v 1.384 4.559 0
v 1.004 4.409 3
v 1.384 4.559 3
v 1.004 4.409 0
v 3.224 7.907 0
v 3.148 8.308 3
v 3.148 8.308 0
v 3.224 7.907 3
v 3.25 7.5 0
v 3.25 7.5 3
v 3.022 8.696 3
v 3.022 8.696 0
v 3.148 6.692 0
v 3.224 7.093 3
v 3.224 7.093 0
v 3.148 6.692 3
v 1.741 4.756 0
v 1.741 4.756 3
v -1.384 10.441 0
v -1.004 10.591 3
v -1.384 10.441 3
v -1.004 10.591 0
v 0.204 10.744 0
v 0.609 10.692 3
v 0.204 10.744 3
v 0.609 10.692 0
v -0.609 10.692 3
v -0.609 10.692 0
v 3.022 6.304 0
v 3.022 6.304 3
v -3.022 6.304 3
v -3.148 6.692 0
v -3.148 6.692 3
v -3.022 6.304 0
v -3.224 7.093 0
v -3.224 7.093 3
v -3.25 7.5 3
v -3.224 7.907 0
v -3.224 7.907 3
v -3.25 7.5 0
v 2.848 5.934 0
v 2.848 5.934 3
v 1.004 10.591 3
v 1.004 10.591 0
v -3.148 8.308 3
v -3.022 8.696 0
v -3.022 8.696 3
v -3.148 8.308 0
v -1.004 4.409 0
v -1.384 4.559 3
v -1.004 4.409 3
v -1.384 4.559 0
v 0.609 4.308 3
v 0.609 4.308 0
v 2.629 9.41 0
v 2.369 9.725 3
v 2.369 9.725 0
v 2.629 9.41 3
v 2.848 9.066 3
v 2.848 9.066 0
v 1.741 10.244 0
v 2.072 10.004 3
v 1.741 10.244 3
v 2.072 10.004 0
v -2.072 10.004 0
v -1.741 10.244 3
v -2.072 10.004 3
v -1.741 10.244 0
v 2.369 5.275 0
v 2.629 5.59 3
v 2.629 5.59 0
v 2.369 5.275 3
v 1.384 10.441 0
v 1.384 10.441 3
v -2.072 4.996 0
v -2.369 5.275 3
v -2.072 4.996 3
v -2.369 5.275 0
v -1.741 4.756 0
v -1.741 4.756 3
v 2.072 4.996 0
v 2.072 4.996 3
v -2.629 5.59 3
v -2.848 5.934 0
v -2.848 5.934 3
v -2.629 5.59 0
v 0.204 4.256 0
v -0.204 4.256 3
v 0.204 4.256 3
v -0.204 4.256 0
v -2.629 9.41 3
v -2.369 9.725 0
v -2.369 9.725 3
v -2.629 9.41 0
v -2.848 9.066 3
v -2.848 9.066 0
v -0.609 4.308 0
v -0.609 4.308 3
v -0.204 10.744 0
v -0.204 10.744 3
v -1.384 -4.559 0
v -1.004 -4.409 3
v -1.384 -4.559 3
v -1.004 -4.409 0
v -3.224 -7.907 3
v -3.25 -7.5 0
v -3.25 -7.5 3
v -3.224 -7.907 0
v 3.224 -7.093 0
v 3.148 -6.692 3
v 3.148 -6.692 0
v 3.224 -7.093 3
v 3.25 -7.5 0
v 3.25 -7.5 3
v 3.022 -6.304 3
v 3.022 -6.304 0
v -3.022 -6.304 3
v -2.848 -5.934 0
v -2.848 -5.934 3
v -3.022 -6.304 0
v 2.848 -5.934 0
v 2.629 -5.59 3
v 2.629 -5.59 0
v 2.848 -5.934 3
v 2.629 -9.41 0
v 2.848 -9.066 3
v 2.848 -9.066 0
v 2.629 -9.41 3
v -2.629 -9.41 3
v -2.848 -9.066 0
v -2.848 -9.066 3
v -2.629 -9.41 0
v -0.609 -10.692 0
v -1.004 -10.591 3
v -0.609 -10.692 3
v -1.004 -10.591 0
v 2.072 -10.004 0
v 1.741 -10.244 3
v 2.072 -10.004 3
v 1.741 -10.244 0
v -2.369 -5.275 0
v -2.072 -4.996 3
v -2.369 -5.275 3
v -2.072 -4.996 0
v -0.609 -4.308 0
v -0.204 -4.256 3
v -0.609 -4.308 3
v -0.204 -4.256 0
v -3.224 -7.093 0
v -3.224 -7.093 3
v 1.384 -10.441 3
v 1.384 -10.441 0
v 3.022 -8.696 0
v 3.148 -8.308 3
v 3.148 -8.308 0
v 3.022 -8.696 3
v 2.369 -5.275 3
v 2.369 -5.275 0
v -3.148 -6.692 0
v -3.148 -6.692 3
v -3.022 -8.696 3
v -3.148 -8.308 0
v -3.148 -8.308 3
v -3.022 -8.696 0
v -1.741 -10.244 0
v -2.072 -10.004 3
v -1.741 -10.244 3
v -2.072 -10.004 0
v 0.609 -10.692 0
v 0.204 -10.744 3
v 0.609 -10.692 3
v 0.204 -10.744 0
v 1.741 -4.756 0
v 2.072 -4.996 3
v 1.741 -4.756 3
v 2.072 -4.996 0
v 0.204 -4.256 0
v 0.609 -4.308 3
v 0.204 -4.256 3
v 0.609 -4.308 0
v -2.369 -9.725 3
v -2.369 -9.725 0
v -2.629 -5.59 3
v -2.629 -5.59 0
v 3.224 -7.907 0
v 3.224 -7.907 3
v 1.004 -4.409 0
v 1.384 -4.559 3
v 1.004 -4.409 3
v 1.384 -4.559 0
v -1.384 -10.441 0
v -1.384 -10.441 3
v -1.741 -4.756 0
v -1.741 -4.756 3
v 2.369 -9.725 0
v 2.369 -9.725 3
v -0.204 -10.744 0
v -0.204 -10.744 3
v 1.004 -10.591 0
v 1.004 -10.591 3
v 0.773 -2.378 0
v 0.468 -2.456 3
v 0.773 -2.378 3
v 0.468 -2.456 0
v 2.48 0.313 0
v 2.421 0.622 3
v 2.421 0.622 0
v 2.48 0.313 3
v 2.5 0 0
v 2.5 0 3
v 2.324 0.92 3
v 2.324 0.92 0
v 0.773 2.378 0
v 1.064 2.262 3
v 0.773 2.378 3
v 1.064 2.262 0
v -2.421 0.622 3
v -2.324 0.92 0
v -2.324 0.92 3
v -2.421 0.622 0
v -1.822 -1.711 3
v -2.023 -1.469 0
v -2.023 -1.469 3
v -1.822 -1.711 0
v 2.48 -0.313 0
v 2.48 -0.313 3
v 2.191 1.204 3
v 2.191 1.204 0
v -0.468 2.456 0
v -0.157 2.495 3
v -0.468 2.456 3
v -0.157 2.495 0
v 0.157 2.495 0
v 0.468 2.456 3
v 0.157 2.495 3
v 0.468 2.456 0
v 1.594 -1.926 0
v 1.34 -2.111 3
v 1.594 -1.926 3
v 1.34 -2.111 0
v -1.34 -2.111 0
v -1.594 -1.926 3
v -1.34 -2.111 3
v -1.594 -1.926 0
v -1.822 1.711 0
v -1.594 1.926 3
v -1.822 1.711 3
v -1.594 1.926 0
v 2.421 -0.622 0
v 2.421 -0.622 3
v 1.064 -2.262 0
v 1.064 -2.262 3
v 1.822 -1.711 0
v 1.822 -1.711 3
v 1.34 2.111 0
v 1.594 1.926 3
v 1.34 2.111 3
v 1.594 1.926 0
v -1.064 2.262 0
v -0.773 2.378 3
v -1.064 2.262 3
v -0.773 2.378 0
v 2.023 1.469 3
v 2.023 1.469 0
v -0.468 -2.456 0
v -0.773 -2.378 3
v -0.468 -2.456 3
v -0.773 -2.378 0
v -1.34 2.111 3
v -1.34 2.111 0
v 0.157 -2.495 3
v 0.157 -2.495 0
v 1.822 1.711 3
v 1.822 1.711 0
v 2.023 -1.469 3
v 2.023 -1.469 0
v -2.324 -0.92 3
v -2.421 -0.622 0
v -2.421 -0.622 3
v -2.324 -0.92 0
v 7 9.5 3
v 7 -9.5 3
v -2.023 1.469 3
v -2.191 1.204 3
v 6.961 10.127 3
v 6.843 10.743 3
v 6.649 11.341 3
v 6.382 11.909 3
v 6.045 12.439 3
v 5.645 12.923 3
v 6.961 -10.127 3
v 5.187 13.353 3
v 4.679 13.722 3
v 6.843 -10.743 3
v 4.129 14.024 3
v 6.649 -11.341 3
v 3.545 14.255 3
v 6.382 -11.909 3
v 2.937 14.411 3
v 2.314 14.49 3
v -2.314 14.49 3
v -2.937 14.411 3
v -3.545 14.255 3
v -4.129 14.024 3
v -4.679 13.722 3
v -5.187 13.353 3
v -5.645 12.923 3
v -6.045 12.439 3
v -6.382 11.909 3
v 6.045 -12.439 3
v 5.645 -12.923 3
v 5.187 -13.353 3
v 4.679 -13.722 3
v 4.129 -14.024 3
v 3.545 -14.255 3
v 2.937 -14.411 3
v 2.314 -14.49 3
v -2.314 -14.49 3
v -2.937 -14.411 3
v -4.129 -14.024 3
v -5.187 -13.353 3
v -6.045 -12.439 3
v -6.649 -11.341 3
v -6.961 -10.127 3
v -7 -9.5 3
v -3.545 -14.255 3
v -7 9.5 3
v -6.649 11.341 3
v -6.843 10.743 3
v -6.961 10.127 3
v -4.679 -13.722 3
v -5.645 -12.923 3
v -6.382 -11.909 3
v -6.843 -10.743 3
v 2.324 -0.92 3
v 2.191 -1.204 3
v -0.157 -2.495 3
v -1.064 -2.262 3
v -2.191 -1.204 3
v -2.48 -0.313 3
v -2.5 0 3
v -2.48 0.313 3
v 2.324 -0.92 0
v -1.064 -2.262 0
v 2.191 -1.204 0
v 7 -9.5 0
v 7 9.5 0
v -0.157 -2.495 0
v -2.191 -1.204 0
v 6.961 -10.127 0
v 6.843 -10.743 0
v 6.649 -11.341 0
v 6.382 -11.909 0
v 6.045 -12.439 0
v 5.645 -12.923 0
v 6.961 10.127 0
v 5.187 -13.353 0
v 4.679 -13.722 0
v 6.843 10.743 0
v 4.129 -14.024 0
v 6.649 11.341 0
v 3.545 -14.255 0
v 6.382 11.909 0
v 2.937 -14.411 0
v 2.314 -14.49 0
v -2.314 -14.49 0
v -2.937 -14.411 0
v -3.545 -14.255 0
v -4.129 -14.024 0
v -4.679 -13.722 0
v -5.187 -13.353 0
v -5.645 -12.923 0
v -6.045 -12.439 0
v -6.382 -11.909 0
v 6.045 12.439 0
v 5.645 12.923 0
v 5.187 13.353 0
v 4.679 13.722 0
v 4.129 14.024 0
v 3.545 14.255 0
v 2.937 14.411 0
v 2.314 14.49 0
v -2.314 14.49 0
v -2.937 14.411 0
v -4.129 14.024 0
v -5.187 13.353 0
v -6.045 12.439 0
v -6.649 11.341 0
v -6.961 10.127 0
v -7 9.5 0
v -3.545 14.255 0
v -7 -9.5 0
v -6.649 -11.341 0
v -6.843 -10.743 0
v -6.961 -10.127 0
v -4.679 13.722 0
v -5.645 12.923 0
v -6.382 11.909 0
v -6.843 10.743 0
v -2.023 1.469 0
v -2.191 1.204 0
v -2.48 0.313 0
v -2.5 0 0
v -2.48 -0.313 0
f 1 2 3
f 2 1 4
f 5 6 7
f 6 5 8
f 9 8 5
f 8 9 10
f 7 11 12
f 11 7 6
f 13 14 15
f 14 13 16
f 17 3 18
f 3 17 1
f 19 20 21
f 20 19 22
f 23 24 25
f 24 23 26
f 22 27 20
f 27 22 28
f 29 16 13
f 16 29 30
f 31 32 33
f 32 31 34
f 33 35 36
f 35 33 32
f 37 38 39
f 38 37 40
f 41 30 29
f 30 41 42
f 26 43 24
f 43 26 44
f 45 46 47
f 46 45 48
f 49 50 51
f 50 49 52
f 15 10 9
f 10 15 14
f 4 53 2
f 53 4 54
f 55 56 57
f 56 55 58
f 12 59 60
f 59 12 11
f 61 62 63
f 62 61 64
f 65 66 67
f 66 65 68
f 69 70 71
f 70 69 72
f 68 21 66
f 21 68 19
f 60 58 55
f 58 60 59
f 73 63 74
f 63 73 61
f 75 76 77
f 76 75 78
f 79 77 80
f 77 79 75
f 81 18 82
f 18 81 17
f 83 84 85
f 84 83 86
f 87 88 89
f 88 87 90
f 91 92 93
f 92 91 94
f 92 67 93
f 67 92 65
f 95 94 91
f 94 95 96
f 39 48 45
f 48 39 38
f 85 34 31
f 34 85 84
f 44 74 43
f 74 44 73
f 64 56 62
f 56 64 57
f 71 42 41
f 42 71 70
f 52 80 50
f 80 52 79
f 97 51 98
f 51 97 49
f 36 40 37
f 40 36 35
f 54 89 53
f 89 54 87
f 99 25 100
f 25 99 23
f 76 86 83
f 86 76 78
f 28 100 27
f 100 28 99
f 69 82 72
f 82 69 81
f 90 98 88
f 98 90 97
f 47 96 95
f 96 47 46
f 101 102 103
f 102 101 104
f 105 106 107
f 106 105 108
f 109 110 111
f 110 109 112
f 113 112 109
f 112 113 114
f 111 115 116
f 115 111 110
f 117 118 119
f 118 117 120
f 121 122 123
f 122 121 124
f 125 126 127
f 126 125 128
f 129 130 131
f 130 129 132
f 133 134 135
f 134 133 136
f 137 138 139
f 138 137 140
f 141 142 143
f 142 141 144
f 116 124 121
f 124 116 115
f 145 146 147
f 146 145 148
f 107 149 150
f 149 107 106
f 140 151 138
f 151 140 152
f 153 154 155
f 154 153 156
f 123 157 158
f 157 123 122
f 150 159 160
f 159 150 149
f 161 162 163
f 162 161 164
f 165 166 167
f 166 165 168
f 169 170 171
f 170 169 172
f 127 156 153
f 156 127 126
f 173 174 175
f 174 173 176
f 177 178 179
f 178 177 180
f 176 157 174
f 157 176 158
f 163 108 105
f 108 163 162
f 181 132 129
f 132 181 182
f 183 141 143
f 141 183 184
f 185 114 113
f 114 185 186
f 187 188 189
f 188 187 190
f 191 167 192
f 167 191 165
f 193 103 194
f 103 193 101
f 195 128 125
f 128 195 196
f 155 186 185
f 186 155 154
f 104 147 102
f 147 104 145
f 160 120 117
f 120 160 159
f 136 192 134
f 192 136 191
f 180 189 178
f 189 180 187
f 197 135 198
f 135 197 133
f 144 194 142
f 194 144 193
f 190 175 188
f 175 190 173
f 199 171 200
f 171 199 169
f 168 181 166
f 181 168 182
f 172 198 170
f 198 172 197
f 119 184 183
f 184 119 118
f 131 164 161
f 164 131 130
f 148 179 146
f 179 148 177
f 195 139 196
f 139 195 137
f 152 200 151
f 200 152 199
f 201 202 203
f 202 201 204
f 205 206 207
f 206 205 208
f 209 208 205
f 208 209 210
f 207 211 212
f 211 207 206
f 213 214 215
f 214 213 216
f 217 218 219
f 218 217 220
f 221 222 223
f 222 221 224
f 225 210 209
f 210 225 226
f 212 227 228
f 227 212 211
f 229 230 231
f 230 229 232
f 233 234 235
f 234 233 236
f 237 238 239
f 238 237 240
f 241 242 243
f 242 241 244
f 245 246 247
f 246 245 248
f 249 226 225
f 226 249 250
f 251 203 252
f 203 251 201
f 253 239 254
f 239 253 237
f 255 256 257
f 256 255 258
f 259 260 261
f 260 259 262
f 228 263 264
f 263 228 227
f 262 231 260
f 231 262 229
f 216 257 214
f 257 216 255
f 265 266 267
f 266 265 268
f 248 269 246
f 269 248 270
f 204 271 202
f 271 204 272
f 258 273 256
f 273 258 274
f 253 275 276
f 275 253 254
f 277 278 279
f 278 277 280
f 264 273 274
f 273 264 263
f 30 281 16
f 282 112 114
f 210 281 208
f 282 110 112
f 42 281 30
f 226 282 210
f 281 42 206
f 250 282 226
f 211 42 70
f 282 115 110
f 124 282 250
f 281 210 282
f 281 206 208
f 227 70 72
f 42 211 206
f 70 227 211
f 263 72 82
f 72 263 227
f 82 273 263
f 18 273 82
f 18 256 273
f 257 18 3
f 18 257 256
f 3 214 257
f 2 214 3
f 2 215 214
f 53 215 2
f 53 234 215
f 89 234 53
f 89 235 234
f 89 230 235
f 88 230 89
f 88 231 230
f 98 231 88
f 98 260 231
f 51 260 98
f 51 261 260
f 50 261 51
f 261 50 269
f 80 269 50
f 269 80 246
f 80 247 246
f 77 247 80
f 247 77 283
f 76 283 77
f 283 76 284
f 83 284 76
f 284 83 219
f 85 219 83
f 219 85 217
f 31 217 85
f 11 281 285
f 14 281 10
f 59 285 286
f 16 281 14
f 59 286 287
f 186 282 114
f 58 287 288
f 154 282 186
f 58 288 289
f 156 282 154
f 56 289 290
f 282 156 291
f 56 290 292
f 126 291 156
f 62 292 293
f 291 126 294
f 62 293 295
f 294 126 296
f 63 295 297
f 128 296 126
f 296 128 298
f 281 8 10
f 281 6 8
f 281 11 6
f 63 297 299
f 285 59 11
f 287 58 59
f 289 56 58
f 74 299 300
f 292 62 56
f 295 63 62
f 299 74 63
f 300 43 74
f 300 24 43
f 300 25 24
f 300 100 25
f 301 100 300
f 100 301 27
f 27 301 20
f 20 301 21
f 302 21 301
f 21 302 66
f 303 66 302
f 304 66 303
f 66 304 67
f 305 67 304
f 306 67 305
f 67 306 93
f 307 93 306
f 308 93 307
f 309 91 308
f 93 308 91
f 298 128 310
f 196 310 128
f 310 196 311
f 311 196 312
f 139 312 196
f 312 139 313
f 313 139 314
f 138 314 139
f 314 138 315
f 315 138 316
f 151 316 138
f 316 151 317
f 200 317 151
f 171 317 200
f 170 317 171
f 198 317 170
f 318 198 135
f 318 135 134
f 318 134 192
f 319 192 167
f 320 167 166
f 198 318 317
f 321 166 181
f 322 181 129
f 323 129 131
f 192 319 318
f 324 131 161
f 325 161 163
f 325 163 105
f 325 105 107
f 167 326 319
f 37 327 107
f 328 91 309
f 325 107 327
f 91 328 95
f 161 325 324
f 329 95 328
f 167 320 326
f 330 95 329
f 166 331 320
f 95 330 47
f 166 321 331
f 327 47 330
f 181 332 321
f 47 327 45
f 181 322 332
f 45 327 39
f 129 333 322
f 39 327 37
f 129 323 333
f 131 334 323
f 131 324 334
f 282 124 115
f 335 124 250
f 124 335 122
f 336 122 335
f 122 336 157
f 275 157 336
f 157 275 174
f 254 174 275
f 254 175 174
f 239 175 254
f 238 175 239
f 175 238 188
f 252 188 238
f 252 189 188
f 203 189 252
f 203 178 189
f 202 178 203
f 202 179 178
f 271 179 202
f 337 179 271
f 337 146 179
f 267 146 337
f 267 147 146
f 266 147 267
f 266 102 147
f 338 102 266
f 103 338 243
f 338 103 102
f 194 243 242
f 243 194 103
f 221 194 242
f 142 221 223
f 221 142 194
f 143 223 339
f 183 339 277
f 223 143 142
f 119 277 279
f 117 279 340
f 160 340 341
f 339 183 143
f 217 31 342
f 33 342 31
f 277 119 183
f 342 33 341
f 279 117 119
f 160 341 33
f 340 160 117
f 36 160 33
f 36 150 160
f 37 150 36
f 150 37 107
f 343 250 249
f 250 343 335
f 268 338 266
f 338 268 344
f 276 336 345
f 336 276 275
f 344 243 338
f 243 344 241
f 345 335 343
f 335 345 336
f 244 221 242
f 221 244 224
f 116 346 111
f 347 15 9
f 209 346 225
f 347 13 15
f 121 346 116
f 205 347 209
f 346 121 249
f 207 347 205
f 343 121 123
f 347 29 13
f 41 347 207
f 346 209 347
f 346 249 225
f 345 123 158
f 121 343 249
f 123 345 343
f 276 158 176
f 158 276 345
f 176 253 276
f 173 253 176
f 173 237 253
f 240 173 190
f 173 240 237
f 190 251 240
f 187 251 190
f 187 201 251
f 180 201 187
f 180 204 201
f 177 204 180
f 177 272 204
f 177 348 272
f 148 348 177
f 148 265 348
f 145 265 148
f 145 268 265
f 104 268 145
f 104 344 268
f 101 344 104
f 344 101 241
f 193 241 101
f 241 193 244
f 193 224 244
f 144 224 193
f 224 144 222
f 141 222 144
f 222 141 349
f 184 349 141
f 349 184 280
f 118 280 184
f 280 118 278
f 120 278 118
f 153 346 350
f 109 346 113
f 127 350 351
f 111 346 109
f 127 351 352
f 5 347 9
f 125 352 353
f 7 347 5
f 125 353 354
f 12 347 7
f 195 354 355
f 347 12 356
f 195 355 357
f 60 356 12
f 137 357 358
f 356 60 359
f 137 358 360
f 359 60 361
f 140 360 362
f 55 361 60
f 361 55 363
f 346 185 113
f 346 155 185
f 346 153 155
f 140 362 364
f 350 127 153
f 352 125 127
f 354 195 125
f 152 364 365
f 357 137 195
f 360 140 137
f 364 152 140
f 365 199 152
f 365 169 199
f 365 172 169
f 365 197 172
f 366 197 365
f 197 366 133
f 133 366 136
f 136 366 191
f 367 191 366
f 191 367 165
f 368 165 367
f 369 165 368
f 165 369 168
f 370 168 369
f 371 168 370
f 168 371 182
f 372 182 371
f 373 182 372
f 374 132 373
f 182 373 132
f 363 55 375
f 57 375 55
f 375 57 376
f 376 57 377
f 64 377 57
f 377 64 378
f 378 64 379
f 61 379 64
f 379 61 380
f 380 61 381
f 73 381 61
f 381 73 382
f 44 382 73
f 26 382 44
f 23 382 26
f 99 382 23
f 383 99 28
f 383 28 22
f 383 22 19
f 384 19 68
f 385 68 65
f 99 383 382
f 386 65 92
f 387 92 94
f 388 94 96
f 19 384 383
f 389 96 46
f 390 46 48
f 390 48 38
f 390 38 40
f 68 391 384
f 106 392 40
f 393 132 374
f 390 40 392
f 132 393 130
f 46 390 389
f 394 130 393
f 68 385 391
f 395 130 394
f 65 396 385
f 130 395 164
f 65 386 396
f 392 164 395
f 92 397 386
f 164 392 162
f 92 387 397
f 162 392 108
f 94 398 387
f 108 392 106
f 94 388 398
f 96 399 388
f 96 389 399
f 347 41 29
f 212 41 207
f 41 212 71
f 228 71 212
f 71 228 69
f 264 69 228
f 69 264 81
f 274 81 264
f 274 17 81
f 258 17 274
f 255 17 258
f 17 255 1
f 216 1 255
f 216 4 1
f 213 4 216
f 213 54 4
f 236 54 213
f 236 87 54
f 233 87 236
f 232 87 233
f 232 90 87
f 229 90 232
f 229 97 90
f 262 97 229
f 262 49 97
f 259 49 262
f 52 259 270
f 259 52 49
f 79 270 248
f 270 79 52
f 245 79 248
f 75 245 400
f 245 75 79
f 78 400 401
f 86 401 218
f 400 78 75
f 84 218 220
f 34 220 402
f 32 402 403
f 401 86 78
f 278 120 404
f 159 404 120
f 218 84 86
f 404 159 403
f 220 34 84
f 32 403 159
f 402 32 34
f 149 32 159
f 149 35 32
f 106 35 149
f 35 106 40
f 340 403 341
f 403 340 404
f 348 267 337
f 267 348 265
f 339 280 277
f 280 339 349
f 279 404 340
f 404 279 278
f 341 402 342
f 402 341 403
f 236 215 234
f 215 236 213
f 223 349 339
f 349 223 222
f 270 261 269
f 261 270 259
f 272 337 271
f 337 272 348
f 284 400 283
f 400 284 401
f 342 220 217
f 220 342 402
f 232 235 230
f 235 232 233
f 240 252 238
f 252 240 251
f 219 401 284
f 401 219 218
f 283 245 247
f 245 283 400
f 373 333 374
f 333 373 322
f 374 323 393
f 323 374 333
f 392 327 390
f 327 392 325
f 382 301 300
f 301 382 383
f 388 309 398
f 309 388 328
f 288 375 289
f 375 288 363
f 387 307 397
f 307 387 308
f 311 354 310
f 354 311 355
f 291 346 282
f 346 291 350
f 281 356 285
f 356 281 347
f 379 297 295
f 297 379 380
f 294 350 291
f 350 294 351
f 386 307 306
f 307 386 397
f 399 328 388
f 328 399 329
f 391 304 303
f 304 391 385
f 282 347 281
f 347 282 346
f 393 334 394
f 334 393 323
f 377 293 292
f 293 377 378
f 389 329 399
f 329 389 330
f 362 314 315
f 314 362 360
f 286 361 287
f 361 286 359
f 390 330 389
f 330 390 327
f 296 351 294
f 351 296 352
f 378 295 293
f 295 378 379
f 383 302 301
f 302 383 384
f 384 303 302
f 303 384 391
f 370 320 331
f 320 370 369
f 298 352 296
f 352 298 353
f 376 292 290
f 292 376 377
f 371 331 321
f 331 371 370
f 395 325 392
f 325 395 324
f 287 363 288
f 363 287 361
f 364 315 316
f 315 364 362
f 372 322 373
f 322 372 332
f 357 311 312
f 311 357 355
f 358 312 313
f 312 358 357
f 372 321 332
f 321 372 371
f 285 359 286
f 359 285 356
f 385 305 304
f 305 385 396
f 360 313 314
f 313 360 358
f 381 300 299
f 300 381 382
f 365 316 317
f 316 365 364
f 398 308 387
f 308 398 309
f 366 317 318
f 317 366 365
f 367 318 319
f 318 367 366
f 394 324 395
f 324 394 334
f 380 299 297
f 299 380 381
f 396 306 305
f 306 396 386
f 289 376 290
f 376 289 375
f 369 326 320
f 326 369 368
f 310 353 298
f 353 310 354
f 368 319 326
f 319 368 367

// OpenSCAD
$fn = 50;


difference() {
	union() {
		hull() {
			translate(v = [-2.0000000000, 9.5000000000, 0]) {
				cylinder(h = 3, r = 5);
			}
			translate(v = [2.0000000000, 9.5000000000, 0]) {
				cylinder(h = 3, r = 5);
			}
			translate(v = [-2.0000000000, -9.5000000000, 0]) {
				cylinder(h = 3, r = 5);
			}
			translate(v = [2.0000000000, -9.5000000000, 0]) {
				cylinder(h = 3, r = 5);
			}
		}
	}
	union() {
		#translate(v = [0.0000000000, 7.5000000000, 0]) {
			cylinder(h = 3, r = 3.2500000000);
		}
		#translate(v = [0.0000000000, -7.5000000000, 0]) {
			cylinder(h = 3, r = 3.2500000000);
		}
		#translate(v = [0.0000000000, -7.5000000000, -100.0000000000]) {
			cylinder(h = 200, r = 3.2500000000);
		}
		#translate(v = [0.0000000000, -7.5000000000, -100.0000000000]) {
			cylinder(h = 200, r = 3.2500000000);
		}
		#translate(v = [0.0000000000, 7.5000000000, -100.0000000000]) {
			cylinder(h = 200, r = 3.2500000000);
		}
		#translate(v = [0.0000000000, 7.5000000000, -100.0000000000]) {
			cylinder(h = 200, r = 3.2500000000);
		}
		#translate(v = [0.0000000000, 7.5000000000, 0]) {
			cylinder(h = 3, r = 1.8000000000);
		}
		#translate(v = [0.0000000000, -7.5000000000, 0]) {
			cylinder(h = 3, r = 1.8000000000);
		}
		#translate(v = [0.0000000000, 7.5000000000, 0]) {
			cylinder(h = 3, r = 1.8000000000);
		}
		#translate(v = [0.0000000000, -7.5000000000, 0]) {
			cylinder(h = 3, r = 1.8000000000);
		}
		#translate(v = [0.0000000000, 7.5000000000, 0]) {
			cylinder(h = 3, r = 1.8000000000);
		}
		#translate(v = [0.0000000000, -7.5000000000, 0]) {
			cylinder(h = 3, r = 1.8000000000);
		}
		#cylinder(h = 3, r = 2.5000000000);
	}
}
